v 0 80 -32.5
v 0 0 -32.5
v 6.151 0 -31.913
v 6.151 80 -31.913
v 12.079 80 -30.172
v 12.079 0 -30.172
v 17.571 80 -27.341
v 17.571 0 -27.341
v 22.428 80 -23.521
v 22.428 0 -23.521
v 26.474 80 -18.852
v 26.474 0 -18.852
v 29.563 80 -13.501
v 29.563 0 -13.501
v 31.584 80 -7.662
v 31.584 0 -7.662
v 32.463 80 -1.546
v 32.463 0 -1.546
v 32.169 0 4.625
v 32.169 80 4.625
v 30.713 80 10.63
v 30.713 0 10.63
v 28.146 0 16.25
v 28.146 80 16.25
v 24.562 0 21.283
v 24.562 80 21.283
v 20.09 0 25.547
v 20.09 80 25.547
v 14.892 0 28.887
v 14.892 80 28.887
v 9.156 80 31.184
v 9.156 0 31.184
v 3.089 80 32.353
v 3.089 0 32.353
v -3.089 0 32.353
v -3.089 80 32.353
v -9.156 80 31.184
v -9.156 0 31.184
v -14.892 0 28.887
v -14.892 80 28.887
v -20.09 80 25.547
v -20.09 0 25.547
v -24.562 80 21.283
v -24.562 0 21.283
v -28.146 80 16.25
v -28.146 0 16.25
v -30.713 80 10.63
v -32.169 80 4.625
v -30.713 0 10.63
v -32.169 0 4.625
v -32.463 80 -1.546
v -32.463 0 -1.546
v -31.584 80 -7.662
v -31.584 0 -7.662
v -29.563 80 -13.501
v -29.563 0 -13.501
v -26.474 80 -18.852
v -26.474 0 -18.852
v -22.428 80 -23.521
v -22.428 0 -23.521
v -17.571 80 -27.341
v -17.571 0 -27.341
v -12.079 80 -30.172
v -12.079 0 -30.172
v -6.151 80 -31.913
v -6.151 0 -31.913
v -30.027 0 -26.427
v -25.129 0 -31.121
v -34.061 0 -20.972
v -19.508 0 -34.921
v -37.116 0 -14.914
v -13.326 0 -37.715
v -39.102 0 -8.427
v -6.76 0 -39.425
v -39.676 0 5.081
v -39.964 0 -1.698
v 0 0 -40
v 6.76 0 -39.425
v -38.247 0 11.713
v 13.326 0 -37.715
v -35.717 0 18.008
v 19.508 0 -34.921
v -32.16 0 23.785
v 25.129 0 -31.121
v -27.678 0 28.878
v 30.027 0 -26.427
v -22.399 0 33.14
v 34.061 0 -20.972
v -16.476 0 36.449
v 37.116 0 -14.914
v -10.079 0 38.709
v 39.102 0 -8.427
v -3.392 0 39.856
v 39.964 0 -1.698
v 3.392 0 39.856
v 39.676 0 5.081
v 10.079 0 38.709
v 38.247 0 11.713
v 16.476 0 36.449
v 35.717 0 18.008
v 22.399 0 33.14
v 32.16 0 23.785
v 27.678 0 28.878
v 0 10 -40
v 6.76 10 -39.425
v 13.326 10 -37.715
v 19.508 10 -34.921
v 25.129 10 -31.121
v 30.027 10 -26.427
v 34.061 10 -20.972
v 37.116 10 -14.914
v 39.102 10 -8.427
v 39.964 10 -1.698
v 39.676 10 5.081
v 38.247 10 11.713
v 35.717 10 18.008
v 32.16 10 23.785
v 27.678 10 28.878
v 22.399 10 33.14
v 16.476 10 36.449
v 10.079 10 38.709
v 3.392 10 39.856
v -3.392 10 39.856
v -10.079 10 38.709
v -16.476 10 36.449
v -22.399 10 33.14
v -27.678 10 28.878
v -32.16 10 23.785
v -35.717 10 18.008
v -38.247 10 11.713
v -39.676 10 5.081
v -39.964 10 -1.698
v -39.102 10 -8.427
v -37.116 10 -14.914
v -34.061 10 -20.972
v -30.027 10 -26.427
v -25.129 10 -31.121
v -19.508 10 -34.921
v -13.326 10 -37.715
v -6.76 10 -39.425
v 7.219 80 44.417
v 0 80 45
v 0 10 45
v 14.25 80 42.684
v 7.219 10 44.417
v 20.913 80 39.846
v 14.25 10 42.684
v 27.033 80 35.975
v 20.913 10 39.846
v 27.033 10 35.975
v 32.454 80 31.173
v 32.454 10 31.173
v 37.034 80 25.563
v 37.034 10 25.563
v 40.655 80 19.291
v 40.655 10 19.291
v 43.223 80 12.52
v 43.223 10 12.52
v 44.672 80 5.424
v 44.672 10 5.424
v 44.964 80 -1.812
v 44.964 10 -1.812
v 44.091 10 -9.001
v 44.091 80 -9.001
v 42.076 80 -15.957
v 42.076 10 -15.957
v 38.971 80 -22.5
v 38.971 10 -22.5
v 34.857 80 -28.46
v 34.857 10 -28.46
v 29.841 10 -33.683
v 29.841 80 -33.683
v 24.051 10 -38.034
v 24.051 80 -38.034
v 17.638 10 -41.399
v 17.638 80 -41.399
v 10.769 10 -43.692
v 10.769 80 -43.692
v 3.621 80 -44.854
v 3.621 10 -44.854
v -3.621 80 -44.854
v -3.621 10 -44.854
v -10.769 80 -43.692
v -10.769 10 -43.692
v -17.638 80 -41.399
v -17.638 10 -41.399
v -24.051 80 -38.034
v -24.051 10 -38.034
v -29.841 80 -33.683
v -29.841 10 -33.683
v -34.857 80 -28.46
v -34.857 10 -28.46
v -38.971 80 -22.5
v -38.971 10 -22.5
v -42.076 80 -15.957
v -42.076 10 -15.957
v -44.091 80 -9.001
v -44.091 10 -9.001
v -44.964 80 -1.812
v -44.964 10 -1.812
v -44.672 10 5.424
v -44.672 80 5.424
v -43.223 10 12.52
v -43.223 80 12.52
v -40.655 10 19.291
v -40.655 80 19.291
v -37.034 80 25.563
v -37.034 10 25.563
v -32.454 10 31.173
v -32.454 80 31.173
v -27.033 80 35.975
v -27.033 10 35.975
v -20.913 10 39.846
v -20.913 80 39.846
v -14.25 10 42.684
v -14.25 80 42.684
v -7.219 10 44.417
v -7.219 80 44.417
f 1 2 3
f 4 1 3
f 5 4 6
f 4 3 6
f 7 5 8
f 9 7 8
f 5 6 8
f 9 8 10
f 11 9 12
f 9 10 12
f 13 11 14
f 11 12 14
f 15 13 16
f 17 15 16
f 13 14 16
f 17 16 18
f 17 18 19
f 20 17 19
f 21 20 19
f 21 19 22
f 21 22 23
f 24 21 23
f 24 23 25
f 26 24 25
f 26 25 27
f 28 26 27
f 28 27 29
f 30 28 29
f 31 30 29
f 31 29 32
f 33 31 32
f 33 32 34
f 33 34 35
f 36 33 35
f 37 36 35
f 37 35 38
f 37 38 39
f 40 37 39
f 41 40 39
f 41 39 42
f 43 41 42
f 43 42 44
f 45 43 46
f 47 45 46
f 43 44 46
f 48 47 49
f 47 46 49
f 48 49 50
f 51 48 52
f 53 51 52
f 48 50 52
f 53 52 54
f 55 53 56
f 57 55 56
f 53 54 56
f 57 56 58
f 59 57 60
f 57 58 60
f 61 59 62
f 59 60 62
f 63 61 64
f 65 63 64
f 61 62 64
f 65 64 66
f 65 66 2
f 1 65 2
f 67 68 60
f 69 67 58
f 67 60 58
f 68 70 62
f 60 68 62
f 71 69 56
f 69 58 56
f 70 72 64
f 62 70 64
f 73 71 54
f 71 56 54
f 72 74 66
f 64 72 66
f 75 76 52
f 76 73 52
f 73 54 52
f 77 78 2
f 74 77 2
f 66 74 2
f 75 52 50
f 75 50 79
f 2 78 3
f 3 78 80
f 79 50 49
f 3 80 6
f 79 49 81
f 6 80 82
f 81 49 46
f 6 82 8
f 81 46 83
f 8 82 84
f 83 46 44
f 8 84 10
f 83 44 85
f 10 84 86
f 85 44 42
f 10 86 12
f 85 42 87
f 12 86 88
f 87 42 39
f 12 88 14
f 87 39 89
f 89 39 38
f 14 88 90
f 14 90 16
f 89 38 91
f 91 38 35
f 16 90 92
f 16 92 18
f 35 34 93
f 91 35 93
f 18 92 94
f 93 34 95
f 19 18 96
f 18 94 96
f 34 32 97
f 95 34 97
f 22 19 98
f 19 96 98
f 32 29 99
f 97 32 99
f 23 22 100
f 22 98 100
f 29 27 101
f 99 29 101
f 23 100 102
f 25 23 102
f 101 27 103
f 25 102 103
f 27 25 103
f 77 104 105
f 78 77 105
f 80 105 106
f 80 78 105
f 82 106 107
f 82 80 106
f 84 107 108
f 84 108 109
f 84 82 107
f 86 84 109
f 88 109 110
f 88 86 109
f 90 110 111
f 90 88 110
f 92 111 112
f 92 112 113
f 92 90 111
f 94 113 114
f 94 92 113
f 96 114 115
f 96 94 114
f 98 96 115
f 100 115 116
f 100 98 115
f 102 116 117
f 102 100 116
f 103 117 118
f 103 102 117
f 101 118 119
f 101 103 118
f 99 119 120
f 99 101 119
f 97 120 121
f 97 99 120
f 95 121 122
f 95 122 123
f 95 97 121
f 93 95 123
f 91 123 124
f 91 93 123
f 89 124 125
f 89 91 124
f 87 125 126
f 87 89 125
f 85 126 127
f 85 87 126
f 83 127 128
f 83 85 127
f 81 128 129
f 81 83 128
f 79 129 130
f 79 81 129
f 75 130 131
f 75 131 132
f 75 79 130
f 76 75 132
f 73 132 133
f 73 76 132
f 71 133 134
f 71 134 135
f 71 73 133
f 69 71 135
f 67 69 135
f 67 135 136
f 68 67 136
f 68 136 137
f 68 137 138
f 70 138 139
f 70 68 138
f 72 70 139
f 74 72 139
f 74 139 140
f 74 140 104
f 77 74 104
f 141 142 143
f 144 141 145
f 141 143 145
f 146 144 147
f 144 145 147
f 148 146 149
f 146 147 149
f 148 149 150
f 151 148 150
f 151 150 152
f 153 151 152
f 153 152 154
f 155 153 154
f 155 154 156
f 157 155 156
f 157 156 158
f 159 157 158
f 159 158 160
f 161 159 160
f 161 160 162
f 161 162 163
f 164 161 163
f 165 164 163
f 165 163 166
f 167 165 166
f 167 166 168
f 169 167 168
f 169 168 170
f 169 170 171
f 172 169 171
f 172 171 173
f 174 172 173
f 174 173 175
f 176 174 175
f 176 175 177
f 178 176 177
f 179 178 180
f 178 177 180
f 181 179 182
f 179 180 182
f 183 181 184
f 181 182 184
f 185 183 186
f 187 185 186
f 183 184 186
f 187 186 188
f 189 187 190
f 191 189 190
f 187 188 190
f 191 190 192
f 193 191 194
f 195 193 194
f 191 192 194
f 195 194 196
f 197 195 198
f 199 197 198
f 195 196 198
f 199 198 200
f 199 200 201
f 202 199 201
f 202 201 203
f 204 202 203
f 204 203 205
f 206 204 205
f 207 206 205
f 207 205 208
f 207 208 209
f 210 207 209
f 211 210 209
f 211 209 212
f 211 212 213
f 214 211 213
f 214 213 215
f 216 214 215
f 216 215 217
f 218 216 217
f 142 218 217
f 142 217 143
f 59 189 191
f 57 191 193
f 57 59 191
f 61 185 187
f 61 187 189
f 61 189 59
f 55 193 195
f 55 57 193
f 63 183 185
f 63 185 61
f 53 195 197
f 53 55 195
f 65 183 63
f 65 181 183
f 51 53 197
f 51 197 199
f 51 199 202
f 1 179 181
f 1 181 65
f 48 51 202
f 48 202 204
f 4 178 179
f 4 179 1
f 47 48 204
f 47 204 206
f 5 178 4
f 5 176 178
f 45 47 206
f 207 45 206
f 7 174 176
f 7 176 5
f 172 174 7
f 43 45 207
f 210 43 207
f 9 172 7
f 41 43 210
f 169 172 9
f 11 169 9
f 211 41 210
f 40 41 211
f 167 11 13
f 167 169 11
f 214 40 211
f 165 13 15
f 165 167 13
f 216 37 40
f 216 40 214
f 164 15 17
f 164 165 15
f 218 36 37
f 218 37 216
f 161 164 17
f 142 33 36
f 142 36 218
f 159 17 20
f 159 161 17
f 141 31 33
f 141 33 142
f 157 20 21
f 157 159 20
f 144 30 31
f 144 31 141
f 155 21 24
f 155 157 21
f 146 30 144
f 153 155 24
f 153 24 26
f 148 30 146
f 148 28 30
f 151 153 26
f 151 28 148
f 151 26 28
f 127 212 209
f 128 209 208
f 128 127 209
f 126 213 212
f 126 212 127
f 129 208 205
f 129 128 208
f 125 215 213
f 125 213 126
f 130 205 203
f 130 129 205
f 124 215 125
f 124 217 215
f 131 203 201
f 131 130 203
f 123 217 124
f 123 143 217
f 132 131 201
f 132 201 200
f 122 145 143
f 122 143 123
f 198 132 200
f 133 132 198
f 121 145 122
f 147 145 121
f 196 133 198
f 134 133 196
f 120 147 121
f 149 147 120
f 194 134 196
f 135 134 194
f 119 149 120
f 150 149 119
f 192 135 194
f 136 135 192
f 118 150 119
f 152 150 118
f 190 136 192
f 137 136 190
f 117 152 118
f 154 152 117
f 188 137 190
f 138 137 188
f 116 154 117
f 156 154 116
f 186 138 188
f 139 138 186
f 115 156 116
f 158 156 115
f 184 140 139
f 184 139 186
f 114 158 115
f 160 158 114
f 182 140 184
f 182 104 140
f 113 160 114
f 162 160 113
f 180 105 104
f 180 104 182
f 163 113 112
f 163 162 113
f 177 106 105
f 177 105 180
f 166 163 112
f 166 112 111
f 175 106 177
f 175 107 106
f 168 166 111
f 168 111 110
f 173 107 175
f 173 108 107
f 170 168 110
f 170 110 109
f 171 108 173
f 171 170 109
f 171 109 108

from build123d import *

# Parameters (mm, degrees)
SKETCH1_R           = 45
BOSS_EXTRUDE1_DEPTH = 80
SKETCH2_R           = 45
SKETCH2_R_2         = 40
CUT_EXTRUDE3_DEPTH  = 10
SKETCH3_R           = 32.5
CUT_EXTRUDE4_DEPTH  = 103.225241501


with BuildPart() as part:
    # Sketch1 → Boss-Extrude1 (new body)
    with BuildSketch(Plane(origin=(0, 0, 0), x_dir=(1, 0, 0), z_dir=(0, 1, 0))):
        with Locations(Location((0, 0, 0), (0, 0, 270))):
            Circle(SKETCH1_R)
    extrude(amount=BOSS_EXTRUDE1_DEPTH)

    # Sketch2 → Cut-Extrude3 (cut)
    with BuildSketch(Plane.XZ):
        with Locations(Location((0, 0, 0), (0, 0, 270))):
            Circle(SKETCH2_R)
        with Locations(Location((0, 0, 0), (0, 0, 270))):
            Circle(SKETCH2_R_2, mode=Mode.SUBTRACT)
    extrude(amount=-CUT_EXTRUDE3_DEPTH, mode=Mode.SUBTRACT)

    # Sketch3 → Cut-Extrude4 (cut, through all)
    with BuildSketch(Plane.XZ):
        with Locations(Location((0, 0, 0), (0, 0, 270))):
            Circle(SKETCH3_R)
    extrude(amount=-CUT_EXTRUDE4_DEPTH, mode=Mode.SUBTRACT)


solid = part.part
